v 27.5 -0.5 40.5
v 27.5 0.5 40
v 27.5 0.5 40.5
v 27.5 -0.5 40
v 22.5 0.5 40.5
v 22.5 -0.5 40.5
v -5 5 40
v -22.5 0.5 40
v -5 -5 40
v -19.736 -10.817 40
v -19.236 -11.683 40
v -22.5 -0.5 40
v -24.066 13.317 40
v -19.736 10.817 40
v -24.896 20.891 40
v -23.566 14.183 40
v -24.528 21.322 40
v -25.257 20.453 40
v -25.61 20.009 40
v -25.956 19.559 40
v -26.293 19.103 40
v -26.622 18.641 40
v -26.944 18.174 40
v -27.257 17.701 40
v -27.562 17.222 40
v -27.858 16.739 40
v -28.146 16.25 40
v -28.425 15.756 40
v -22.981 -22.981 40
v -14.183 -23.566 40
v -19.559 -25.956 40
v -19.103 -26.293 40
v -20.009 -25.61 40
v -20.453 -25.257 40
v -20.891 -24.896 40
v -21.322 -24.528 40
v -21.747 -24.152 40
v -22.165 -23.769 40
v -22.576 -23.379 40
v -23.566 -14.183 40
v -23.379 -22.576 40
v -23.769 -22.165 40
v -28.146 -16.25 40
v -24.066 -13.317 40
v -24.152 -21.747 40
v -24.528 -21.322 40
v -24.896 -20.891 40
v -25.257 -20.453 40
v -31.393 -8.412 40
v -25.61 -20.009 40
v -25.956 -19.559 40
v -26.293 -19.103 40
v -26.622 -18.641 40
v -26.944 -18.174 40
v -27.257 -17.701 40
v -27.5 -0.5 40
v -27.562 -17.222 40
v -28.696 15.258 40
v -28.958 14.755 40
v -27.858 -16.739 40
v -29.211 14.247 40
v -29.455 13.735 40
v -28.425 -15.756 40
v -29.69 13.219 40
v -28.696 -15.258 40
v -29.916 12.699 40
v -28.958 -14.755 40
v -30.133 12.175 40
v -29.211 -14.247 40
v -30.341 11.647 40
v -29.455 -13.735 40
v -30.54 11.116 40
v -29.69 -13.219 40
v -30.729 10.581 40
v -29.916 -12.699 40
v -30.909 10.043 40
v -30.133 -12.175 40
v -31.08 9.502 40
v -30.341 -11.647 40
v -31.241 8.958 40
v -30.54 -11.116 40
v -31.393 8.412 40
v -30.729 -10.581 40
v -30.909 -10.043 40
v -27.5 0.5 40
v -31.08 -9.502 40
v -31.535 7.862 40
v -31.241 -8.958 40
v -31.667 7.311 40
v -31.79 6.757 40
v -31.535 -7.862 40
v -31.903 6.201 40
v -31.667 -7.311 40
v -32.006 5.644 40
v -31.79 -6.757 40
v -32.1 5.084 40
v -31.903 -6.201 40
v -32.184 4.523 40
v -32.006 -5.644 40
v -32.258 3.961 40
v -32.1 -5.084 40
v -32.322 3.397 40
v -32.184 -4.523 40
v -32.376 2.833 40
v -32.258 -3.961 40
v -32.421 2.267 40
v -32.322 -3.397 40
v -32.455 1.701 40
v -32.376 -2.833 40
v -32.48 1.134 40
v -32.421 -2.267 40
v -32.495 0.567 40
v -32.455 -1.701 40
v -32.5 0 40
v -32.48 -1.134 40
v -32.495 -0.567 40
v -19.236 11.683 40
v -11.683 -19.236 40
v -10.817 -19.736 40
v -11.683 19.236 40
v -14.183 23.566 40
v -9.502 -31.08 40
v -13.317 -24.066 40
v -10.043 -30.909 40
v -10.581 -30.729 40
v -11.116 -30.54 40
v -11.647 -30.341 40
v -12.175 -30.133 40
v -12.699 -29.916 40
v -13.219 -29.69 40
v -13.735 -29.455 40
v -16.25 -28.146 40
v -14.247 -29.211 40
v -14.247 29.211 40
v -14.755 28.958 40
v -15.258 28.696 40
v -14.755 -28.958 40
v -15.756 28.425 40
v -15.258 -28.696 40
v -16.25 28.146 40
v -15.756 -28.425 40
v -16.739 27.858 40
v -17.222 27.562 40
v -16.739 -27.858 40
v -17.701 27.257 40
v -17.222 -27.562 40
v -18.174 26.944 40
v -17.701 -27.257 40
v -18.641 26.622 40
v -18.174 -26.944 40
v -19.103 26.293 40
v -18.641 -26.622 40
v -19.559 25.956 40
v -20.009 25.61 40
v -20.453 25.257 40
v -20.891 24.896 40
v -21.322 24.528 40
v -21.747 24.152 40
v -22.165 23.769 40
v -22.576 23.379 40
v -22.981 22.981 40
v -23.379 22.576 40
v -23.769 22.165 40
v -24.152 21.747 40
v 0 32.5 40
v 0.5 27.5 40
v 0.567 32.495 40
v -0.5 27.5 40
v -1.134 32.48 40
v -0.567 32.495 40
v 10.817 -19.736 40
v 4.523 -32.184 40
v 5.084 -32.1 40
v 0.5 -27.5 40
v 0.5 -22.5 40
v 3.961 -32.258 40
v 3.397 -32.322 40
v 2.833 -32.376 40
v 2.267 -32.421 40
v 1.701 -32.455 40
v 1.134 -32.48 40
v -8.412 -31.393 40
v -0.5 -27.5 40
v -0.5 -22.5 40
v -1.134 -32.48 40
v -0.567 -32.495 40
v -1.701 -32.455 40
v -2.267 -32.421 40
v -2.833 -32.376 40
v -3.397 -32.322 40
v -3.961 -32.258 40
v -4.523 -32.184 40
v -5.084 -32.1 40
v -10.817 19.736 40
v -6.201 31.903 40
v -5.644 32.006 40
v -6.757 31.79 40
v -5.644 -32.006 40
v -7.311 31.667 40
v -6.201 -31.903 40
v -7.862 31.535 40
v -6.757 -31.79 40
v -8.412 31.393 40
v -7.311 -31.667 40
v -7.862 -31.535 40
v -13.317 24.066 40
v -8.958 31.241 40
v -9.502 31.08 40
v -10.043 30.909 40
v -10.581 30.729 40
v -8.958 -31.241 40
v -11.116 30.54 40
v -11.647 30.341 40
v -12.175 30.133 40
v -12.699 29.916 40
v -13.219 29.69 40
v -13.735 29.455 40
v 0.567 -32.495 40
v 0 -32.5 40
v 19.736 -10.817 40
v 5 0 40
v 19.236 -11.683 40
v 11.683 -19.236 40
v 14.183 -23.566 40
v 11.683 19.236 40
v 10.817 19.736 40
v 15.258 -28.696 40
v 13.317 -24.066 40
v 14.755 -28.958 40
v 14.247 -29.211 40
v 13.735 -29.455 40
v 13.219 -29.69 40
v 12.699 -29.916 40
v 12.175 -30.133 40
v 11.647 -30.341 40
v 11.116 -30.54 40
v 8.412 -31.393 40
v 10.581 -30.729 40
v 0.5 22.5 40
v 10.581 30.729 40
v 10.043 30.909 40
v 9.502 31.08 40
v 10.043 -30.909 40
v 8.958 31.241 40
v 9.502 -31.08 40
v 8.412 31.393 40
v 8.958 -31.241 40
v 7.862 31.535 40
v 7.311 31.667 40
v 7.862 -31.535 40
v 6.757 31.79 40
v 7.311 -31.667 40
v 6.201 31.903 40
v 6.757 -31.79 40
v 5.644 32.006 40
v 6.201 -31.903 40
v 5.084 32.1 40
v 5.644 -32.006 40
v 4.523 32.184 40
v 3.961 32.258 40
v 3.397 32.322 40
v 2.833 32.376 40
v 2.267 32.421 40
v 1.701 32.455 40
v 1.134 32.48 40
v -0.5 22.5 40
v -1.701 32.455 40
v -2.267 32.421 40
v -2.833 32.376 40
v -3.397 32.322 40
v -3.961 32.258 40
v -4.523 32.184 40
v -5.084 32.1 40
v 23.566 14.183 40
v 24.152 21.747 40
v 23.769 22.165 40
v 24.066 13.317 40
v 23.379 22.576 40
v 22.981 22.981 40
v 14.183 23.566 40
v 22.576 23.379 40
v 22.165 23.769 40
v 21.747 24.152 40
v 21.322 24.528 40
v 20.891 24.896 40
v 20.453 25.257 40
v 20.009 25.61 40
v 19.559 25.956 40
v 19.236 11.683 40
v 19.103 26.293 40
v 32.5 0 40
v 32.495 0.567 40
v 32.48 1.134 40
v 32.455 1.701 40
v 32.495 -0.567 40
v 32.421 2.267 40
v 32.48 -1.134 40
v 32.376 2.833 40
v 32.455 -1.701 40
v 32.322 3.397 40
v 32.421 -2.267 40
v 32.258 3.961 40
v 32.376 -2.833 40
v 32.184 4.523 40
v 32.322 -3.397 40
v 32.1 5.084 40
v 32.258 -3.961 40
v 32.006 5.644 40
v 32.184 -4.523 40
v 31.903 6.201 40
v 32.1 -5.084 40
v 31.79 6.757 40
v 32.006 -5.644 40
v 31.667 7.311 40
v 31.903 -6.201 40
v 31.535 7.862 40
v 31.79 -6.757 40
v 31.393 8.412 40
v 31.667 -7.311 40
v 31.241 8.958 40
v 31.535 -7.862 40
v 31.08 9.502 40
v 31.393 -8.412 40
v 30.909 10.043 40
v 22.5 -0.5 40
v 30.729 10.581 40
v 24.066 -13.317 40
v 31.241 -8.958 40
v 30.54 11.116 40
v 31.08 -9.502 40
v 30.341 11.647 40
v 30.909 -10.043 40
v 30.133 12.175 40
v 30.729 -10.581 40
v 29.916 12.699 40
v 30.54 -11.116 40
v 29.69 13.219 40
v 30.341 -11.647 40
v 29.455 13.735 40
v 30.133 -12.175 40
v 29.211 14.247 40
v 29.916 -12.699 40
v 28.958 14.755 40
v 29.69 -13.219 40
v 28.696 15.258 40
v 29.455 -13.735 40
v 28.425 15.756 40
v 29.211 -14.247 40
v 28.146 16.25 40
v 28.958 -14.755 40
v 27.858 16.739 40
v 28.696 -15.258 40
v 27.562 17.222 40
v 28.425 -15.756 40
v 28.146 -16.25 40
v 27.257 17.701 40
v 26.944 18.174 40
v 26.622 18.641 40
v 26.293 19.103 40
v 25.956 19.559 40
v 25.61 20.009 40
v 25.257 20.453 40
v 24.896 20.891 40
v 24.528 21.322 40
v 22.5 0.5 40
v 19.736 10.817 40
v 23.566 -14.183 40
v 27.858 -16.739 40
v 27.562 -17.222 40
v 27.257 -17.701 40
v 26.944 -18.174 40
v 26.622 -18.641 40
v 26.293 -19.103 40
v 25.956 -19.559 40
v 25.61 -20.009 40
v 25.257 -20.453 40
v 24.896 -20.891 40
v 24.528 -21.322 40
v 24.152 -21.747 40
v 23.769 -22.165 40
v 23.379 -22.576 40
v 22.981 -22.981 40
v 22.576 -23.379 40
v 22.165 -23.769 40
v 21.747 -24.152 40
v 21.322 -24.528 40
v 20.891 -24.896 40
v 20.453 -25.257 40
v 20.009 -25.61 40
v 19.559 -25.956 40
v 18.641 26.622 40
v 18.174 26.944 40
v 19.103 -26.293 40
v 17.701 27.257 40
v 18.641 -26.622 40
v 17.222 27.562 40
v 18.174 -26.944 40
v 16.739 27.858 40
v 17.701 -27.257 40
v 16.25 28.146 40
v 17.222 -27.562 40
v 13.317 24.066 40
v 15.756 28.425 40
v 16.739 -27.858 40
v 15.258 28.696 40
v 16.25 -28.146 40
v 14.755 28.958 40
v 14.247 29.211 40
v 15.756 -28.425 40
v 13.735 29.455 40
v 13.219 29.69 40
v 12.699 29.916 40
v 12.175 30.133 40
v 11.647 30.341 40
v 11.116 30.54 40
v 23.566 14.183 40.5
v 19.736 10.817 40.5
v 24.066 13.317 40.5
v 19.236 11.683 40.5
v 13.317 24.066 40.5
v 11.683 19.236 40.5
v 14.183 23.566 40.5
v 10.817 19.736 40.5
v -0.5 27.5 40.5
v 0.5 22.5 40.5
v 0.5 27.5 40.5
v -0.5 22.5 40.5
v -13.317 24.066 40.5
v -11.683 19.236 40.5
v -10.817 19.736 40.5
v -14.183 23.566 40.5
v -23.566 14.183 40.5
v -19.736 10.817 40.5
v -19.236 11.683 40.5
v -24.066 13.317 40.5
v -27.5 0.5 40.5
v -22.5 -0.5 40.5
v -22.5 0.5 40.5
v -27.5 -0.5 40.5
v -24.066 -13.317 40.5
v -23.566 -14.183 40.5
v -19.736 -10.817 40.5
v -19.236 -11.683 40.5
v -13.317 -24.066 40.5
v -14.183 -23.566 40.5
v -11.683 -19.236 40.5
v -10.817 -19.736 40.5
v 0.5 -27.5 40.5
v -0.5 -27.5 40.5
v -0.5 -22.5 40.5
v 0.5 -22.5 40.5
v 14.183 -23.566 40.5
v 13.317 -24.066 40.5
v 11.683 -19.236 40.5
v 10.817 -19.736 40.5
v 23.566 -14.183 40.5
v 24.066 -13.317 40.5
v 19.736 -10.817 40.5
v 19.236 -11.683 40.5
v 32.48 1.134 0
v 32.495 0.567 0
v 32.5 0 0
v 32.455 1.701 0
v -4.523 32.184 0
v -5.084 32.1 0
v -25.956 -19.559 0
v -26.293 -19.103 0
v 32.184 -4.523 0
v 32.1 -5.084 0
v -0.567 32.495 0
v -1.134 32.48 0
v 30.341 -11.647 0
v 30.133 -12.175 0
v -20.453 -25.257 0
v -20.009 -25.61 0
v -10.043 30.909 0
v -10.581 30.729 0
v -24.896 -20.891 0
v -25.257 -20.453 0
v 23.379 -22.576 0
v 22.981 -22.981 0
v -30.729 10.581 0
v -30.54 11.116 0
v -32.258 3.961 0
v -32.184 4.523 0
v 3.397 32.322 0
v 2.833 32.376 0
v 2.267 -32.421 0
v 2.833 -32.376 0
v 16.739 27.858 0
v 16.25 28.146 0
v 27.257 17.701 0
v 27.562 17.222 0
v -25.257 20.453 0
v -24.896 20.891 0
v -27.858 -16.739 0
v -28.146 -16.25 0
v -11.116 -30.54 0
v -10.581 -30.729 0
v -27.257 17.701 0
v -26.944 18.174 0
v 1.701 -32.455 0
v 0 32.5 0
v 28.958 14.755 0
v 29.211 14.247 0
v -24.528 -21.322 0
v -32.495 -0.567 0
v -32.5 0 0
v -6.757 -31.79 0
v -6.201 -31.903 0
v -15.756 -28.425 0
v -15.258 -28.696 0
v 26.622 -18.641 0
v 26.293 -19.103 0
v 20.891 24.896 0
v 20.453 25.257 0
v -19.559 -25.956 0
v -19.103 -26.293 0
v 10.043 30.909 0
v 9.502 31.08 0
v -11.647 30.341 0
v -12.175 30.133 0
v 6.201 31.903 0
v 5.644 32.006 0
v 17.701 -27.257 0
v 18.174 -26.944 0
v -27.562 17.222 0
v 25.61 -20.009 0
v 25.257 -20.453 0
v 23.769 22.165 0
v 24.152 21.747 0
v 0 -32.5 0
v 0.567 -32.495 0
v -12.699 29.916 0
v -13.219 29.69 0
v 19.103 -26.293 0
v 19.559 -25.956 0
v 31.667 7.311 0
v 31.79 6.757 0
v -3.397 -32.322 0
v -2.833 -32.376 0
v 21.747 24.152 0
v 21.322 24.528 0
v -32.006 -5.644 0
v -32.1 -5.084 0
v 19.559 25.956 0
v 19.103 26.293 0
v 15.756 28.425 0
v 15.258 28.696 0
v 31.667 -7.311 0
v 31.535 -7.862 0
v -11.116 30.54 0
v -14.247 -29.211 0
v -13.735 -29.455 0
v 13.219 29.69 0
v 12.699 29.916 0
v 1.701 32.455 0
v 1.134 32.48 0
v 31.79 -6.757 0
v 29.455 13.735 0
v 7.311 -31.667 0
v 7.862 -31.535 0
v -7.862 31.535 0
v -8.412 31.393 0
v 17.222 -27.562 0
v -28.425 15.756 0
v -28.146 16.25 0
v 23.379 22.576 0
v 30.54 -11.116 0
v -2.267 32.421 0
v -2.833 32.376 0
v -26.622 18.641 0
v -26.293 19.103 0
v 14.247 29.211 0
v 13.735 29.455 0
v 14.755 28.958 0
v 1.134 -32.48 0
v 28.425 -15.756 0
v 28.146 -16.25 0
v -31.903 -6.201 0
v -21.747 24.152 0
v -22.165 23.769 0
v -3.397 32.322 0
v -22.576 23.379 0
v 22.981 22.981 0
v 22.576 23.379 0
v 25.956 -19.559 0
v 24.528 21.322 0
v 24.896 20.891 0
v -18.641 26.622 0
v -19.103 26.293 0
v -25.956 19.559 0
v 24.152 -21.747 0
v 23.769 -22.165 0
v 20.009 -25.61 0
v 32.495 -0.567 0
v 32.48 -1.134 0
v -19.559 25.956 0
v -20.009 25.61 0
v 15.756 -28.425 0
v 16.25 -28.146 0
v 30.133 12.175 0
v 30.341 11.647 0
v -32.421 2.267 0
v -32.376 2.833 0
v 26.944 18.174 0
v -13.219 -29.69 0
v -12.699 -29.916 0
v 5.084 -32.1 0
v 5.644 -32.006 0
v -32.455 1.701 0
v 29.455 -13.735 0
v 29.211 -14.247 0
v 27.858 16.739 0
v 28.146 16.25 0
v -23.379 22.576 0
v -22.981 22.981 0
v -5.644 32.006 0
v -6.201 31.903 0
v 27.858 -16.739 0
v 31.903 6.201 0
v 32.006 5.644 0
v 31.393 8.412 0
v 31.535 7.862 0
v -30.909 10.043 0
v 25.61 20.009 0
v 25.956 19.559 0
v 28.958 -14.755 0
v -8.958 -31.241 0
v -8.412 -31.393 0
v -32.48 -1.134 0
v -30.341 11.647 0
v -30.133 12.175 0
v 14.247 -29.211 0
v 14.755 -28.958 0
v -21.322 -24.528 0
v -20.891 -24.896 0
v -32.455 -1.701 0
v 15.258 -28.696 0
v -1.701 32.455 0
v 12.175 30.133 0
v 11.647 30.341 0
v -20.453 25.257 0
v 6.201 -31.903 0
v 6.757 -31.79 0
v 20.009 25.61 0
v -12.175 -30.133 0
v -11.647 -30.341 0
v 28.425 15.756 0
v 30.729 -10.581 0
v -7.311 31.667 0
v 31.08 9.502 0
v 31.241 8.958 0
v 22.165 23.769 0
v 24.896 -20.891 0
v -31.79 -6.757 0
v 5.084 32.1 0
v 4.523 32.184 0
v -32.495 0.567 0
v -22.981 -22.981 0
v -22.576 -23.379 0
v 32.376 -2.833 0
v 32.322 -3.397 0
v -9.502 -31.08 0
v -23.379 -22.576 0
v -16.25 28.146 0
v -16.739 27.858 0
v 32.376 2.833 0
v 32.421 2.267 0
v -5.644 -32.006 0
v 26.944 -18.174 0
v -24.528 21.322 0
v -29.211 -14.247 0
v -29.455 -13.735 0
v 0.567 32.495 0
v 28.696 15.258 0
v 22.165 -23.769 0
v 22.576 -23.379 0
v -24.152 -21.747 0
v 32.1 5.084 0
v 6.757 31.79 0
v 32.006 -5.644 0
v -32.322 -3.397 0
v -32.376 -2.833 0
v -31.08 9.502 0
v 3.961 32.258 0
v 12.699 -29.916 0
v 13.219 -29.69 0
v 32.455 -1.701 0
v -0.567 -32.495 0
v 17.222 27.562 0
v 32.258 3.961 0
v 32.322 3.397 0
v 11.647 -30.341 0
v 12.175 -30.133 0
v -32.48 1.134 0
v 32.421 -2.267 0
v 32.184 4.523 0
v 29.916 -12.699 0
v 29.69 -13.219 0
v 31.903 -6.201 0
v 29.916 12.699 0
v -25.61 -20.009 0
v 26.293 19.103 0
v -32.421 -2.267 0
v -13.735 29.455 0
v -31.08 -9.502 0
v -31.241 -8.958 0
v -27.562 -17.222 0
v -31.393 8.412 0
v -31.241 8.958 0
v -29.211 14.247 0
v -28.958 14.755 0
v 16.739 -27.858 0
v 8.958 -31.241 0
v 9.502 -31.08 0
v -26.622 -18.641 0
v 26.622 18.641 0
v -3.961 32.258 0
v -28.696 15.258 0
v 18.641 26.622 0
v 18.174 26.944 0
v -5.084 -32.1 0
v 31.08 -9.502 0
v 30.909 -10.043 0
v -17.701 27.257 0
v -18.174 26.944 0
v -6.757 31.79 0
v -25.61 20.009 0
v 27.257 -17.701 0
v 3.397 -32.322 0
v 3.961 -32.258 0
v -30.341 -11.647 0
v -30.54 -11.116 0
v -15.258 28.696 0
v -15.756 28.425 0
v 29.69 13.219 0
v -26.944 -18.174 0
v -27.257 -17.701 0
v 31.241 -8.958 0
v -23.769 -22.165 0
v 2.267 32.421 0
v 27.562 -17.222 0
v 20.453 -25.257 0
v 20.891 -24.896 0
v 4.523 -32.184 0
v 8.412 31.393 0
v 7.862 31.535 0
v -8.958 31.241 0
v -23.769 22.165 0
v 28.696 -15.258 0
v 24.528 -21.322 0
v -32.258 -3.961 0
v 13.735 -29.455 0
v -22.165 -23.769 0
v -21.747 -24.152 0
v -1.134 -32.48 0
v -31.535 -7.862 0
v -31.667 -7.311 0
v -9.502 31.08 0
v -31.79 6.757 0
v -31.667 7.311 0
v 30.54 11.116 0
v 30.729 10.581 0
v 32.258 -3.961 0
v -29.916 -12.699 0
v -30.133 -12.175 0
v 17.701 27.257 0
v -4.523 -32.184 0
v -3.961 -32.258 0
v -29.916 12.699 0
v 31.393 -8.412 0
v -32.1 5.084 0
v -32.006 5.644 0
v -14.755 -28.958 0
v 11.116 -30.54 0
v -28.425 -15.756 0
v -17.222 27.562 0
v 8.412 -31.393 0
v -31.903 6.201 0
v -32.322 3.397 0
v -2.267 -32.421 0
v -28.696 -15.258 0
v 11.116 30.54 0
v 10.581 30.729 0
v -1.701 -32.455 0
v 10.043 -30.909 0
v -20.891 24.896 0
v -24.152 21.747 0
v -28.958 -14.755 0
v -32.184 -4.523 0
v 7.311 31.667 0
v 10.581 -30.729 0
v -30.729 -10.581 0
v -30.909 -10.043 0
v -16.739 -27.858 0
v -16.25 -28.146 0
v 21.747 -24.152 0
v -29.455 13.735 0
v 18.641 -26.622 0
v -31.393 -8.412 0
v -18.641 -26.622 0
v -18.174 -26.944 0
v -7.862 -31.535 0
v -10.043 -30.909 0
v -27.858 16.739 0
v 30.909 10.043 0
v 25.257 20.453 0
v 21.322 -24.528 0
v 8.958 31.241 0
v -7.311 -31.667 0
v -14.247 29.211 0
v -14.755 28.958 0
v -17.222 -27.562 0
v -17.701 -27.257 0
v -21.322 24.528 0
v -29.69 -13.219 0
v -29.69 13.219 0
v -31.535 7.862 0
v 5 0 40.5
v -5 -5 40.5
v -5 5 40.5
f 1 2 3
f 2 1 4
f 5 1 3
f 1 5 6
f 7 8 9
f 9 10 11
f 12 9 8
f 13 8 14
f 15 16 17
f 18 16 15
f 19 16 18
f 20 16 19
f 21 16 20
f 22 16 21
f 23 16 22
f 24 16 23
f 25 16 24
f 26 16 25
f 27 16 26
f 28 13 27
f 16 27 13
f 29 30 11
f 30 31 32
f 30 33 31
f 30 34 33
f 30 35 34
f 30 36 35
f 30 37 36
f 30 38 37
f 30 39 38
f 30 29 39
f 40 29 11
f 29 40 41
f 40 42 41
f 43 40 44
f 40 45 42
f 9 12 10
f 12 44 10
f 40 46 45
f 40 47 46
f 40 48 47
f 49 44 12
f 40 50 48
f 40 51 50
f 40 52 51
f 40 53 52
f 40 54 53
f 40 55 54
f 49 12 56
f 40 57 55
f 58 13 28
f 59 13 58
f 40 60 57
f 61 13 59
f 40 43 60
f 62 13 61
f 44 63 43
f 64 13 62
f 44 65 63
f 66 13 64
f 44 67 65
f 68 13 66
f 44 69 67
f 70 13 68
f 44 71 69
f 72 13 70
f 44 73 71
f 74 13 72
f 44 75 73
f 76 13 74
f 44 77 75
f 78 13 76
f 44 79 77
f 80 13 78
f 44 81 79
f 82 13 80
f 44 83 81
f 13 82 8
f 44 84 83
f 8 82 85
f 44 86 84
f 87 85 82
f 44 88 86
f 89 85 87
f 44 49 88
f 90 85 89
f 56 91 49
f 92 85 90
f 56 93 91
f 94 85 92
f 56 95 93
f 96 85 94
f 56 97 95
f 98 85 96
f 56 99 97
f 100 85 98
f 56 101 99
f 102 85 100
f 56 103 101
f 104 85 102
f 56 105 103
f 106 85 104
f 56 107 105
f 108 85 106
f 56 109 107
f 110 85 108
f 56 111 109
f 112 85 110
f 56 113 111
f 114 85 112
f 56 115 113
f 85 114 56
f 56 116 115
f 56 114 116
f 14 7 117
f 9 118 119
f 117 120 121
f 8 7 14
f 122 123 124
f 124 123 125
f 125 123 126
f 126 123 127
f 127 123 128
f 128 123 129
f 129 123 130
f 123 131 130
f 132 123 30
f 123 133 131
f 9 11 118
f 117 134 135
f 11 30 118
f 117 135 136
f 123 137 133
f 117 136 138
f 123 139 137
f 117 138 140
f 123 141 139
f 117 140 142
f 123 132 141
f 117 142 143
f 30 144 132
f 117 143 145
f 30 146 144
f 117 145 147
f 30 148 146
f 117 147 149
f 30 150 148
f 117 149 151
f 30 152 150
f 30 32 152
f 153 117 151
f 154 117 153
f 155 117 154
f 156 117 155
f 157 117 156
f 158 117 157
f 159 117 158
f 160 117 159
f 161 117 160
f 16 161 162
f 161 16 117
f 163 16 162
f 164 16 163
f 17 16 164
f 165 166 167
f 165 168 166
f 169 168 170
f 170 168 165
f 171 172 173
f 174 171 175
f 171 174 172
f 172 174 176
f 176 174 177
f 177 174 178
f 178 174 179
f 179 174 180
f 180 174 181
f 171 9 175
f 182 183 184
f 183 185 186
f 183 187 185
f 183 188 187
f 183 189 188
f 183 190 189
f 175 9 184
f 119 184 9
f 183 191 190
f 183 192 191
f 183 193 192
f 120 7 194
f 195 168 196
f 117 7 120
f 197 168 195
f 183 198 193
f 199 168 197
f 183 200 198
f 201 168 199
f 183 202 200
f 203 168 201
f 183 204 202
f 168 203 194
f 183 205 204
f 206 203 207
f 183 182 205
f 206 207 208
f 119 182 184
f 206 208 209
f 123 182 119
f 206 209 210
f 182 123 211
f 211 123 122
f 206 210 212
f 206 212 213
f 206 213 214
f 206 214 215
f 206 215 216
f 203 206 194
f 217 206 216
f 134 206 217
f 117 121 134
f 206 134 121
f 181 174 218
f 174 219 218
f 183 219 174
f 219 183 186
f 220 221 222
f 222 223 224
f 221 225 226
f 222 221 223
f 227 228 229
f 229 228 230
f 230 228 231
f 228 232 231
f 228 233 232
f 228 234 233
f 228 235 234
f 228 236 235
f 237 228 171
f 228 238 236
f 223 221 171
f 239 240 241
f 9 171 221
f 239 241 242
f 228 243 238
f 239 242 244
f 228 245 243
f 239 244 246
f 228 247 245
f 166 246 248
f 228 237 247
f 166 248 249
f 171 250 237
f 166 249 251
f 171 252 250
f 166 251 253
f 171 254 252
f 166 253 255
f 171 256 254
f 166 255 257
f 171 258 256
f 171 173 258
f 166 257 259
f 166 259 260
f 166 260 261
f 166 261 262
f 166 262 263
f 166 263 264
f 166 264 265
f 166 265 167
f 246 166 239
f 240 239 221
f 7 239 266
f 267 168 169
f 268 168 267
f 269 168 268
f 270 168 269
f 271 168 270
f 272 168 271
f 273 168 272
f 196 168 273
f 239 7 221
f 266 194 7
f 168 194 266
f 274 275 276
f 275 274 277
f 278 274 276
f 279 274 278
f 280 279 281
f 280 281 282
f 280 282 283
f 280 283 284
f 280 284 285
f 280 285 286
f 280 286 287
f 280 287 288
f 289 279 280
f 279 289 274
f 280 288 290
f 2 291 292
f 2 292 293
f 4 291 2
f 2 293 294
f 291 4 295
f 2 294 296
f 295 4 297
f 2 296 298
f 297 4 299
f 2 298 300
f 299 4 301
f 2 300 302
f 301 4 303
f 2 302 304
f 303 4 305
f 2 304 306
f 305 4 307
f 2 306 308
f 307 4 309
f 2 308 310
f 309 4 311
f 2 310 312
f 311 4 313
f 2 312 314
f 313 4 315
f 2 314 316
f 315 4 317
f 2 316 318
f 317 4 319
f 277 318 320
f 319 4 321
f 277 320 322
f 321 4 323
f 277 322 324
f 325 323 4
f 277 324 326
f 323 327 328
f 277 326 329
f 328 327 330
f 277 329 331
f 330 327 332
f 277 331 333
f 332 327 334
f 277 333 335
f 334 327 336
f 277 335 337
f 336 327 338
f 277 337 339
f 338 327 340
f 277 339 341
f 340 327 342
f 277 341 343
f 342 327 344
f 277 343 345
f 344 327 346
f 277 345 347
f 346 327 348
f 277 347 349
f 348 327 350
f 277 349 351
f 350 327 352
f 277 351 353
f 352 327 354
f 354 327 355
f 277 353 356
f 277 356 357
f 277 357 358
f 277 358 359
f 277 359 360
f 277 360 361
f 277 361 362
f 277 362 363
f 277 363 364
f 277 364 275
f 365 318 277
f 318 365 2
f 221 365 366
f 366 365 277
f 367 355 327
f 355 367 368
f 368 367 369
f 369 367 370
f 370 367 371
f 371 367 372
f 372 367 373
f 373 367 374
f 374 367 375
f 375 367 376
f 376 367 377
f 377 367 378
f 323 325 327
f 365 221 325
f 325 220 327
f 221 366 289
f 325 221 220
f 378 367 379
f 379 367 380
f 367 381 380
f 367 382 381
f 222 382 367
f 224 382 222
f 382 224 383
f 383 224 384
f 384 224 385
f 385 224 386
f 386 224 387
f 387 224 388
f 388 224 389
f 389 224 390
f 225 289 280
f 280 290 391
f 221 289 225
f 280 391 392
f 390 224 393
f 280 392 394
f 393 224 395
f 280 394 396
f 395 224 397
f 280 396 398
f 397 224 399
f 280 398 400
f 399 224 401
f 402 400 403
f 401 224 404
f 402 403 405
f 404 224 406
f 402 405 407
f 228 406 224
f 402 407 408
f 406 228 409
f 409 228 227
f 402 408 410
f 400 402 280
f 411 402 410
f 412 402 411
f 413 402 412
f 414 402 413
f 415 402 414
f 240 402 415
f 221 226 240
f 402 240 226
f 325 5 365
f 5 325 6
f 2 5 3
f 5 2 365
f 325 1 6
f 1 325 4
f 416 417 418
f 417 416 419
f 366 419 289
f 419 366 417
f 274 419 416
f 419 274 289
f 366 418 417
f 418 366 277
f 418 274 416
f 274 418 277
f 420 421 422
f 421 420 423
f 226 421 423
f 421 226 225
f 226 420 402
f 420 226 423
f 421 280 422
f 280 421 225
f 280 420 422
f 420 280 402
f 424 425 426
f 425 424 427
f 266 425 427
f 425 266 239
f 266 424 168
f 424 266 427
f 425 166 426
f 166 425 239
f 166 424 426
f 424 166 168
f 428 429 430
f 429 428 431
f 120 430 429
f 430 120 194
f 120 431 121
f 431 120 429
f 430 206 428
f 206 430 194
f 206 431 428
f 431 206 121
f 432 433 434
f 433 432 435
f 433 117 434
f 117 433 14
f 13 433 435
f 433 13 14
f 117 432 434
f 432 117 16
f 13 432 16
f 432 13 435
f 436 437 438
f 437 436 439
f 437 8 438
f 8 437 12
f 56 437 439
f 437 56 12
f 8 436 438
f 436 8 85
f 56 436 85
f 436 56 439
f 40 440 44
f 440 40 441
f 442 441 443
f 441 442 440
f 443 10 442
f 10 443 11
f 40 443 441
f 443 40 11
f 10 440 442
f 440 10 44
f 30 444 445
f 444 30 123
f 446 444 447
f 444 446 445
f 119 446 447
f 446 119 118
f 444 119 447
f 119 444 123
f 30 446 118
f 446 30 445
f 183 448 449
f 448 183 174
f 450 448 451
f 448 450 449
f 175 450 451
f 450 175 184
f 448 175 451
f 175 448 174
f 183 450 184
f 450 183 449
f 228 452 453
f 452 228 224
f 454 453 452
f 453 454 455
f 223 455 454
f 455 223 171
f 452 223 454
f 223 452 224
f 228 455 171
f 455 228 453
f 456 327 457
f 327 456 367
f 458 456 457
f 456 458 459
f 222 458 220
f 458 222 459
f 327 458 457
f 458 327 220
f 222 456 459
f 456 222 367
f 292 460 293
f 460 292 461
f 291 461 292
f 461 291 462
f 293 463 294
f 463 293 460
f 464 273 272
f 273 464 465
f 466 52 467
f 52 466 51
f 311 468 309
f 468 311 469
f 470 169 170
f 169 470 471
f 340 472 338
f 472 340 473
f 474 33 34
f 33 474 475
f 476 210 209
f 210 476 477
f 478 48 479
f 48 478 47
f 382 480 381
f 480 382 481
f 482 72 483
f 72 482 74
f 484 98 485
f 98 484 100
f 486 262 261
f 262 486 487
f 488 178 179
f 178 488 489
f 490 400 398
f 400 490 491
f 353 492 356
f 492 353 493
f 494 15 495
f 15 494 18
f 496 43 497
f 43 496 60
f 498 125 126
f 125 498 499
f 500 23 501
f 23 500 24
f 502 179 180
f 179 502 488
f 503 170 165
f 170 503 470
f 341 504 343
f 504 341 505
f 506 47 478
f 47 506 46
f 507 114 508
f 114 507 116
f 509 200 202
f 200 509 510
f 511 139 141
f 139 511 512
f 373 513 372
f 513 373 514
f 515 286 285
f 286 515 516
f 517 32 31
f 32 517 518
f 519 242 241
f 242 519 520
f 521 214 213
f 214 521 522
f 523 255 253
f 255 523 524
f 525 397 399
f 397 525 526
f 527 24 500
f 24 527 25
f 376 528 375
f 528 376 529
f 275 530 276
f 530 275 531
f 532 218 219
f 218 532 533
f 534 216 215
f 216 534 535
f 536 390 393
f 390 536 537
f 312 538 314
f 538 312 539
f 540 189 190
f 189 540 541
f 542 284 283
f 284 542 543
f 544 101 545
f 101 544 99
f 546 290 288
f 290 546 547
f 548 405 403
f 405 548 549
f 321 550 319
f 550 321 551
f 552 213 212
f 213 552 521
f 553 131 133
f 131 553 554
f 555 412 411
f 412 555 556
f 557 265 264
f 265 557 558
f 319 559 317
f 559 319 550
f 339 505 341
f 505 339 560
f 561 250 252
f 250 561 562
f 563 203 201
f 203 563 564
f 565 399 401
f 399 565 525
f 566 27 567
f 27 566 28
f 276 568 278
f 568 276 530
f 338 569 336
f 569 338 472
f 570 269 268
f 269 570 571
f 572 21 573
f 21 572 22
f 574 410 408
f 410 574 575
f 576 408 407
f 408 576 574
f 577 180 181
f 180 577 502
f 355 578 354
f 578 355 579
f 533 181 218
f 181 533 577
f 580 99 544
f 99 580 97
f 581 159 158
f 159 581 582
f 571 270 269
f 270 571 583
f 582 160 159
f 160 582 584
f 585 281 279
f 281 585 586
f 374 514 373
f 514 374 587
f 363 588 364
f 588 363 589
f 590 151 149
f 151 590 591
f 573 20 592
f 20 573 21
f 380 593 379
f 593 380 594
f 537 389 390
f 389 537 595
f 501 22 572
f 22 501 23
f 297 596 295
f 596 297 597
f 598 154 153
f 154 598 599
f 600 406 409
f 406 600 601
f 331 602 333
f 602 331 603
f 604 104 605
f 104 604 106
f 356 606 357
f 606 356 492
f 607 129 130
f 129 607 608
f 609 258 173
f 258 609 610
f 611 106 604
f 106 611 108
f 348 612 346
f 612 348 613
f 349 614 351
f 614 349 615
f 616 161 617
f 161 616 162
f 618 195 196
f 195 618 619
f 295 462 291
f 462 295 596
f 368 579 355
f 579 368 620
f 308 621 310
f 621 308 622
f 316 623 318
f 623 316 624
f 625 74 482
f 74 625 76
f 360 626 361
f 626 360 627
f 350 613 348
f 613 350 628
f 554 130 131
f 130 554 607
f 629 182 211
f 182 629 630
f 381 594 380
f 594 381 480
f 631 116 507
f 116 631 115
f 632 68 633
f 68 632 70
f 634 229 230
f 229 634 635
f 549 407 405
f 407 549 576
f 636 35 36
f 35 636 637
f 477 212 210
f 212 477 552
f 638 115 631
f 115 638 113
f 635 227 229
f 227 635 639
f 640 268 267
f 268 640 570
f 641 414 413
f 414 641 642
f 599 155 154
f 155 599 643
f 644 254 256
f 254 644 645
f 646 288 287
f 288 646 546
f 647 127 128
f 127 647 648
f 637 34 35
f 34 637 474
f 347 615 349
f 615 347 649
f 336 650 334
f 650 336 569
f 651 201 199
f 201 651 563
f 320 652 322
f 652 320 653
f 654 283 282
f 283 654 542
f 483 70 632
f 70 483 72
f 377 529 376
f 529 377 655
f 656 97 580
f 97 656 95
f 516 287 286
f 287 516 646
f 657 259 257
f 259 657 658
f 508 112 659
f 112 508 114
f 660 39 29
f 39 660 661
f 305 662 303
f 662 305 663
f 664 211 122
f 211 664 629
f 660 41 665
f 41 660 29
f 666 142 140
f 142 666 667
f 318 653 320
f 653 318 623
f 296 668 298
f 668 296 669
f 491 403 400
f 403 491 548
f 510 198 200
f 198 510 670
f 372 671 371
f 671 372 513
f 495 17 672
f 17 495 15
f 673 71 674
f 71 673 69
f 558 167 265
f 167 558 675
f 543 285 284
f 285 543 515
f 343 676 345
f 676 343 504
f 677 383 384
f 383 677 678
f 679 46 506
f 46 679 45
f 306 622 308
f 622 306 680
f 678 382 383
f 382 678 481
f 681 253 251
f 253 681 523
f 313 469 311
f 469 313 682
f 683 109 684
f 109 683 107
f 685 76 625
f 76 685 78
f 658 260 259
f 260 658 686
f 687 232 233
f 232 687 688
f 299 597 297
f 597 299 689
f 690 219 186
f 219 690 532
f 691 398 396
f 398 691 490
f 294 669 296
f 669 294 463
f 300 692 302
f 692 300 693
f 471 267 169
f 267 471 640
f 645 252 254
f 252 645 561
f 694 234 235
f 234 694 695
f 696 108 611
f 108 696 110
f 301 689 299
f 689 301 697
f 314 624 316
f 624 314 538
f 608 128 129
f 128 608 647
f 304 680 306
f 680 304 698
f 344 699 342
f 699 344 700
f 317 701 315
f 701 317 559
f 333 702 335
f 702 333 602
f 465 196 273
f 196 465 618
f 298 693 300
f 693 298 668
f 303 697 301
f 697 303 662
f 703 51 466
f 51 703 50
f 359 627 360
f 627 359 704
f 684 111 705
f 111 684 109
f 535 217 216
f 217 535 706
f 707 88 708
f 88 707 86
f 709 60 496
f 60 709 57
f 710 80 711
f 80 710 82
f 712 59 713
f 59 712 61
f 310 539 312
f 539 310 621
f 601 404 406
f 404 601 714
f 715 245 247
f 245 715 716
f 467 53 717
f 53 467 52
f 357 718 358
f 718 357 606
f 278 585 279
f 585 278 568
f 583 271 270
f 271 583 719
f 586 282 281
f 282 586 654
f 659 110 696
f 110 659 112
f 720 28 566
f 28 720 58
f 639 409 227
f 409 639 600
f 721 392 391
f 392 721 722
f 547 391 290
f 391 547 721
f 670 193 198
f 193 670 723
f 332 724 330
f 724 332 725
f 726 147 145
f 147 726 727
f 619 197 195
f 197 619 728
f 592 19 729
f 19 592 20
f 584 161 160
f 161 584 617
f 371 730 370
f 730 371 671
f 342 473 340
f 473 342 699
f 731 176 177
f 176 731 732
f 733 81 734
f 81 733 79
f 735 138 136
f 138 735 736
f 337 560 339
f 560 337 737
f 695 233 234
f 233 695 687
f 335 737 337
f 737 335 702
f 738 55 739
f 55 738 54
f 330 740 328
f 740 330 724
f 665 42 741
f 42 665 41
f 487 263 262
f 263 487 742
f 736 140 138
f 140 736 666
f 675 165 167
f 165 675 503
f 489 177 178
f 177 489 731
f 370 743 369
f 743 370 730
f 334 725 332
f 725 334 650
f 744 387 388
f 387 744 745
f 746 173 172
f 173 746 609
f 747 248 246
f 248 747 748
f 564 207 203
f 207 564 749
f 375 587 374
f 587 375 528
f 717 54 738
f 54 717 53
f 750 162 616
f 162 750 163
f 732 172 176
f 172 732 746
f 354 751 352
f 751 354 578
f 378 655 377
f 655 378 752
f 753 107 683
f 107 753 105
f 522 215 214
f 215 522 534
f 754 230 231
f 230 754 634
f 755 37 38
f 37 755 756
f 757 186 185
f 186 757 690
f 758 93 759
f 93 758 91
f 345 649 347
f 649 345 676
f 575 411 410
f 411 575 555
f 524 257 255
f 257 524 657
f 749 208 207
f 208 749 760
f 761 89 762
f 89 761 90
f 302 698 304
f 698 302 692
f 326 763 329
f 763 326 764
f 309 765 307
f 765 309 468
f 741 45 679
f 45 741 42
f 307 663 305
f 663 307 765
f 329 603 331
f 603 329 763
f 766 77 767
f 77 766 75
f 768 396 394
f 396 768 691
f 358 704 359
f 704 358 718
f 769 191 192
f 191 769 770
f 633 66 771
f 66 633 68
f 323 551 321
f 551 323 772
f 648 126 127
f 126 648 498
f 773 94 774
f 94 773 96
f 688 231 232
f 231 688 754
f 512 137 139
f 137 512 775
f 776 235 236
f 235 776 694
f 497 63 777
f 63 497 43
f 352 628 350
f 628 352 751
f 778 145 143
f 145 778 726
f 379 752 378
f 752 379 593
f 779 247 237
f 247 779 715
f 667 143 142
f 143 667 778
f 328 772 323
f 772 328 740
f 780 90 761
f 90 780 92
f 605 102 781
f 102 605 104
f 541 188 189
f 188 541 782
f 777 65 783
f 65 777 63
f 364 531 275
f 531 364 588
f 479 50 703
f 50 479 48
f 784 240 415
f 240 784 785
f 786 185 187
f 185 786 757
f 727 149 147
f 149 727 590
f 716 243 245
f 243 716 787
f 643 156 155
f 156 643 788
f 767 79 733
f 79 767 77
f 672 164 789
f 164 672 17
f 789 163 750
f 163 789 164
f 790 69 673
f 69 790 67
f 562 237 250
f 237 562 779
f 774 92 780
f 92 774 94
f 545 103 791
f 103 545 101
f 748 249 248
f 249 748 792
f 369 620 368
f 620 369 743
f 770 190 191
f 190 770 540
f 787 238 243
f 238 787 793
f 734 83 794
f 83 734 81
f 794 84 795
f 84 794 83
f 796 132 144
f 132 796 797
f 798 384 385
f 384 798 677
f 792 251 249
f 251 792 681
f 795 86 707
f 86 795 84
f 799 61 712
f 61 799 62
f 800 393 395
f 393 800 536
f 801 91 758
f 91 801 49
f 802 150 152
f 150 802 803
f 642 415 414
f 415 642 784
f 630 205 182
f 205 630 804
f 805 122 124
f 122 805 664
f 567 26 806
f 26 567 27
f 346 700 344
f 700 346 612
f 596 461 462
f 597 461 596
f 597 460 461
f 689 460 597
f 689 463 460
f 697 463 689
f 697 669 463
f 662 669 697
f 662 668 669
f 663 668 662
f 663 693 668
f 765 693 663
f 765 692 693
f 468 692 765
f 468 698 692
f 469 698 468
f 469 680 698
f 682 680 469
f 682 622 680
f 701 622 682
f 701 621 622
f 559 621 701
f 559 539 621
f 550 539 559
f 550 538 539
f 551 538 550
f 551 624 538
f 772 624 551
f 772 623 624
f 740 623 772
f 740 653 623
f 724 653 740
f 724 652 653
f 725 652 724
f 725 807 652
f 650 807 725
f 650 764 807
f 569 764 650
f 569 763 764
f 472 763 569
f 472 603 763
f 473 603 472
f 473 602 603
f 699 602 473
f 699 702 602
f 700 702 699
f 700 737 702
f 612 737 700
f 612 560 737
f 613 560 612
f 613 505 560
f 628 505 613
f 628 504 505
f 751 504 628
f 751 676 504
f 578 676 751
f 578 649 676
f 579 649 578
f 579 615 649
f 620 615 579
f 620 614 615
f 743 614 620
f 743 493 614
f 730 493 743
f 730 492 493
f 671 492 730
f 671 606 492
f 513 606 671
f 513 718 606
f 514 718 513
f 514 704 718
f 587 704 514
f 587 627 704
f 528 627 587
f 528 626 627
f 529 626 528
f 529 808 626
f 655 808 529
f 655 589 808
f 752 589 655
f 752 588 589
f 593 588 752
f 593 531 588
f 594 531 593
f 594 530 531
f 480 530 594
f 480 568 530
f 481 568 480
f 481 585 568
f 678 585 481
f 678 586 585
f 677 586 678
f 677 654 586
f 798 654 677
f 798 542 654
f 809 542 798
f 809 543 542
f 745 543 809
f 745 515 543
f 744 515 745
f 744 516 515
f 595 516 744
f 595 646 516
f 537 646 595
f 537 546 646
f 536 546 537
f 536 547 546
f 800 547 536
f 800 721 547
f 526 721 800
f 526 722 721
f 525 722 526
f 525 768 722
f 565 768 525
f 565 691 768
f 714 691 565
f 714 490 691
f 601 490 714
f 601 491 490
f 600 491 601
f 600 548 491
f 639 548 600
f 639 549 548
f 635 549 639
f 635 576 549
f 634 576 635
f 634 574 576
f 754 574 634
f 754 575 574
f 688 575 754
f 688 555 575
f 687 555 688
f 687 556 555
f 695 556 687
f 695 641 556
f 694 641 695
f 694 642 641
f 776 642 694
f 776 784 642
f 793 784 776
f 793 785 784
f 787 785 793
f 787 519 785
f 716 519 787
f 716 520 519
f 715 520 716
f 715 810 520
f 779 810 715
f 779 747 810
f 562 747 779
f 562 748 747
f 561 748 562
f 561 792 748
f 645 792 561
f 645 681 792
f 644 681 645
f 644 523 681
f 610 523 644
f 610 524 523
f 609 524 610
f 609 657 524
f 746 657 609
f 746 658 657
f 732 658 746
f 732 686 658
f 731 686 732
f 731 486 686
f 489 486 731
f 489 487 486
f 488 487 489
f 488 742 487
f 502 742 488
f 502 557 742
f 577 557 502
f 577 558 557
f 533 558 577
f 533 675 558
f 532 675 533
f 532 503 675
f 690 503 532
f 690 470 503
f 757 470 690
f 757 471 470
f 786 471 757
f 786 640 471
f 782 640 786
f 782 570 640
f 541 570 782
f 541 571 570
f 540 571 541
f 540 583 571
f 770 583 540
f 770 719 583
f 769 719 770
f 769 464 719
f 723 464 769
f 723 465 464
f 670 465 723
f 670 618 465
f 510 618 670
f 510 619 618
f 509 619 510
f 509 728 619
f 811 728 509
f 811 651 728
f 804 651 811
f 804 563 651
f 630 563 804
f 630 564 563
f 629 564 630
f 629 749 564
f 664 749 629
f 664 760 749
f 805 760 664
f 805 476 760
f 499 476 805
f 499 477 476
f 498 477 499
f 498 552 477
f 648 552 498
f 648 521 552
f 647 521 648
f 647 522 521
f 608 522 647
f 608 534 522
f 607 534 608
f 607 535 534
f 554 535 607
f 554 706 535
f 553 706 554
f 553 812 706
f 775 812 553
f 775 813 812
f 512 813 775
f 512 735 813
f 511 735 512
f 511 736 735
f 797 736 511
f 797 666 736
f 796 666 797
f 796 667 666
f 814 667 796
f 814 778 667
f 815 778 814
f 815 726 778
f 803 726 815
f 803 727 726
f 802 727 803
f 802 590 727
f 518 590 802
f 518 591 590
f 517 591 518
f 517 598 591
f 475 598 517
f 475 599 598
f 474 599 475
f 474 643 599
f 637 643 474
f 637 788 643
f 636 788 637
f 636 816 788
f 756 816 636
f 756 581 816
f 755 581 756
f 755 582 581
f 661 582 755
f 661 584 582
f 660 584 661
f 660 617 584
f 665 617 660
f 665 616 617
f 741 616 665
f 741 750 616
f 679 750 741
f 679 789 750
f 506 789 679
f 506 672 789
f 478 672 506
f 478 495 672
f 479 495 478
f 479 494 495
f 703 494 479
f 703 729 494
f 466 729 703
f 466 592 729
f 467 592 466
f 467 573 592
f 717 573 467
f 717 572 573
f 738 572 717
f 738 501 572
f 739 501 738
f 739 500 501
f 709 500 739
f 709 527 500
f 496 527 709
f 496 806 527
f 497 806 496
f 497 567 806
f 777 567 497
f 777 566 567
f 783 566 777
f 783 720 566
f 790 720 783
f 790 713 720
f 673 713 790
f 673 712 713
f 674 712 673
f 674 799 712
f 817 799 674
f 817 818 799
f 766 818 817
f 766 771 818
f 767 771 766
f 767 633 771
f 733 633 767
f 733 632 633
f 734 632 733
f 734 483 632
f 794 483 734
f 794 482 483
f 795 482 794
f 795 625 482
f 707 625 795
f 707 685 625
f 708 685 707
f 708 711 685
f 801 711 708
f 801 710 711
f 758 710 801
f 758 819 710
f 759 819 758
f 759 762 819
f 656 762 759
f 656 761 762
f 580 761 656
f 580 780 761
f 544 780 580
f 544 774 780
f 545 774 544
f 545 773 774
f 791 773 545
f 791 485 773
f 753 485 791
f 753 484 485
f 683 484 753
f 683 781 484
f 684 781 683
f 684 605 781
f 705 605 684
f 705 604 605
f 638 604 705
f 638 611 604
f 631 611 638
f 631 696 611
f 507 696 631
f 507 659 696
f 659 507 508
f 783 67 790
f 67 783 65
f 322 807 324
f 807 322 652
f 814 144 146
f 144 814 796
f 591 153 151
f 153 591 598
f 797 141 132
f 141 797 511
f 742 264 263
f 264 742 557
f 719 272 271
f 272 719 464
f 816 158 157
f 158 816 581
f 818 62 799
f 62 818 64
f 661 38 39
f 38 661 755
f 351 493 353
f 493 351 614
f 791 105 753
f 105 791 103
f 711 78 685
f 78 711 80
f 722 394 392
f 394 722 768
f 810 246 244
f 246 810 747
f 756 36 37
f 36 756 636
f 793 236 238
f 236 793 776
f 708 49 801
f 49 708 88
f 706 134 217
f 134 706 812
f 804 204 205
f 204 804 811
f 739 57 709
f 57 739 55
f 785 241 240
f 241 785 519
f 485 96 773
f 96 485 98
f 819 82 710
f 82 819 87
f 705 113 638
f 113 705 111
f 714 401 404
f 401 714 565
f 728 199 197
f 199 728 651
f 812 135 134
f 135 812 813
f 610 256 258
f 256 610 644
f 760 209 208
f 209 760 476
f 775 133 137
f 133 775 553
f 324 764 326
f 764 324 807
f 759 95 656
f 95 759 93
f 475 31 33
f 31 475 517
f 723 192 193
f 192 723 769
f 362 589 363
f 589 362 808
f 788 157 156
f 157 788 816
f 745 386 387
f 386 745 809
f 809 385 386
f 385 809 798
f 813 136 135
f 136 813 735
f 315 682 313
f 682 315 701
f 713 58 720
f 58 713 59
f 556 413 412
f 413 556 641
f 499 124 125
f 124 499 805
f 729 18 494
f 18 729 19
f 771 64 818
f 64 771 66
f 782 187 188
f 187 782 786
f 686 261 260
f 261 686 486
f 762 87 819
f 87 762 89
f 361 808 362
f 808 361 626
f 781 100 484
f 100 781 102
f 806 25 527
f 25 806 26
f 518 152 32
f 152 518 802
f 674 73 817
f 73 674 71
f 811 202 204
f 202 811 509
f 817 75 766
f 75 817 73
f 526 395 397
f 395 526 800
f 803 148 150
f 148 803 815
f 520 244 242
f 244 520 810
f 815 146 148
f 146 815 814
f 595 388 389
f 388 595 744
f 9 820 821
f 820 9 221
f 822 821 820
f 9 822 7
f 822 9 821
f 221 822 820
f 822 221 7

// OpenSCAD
r = 65 / 2;
h = 40;
dial_distance_from_edge = 5;
dial_length = 5;
dial_width = 1;
dial_thickness = 0.5;
dial_count = 12;
triangle_width = 10;

$fs = 0.1;
$fa = 1;

cylinder(h=h, r=r);
for(a = [0:360/dial_count:360 - dial_count]) {
	rotate([0, 0, a]) {
		translate([r - dial_distance_from_edge - dial_length, -dial_width / 2, h]) {
			cube([dial_length, dial_width, dial_thickness]);
		}
	}
}
translate([0, 0, h]) {
	linear_extrude(height=dial_thickness) {
		polygon(points=[[-triangle_width / 2, -triangle_width / 2], [triangle_width / 2, 0], [-triangle_width / 2, triangle_width / 2]]);
	}
}
